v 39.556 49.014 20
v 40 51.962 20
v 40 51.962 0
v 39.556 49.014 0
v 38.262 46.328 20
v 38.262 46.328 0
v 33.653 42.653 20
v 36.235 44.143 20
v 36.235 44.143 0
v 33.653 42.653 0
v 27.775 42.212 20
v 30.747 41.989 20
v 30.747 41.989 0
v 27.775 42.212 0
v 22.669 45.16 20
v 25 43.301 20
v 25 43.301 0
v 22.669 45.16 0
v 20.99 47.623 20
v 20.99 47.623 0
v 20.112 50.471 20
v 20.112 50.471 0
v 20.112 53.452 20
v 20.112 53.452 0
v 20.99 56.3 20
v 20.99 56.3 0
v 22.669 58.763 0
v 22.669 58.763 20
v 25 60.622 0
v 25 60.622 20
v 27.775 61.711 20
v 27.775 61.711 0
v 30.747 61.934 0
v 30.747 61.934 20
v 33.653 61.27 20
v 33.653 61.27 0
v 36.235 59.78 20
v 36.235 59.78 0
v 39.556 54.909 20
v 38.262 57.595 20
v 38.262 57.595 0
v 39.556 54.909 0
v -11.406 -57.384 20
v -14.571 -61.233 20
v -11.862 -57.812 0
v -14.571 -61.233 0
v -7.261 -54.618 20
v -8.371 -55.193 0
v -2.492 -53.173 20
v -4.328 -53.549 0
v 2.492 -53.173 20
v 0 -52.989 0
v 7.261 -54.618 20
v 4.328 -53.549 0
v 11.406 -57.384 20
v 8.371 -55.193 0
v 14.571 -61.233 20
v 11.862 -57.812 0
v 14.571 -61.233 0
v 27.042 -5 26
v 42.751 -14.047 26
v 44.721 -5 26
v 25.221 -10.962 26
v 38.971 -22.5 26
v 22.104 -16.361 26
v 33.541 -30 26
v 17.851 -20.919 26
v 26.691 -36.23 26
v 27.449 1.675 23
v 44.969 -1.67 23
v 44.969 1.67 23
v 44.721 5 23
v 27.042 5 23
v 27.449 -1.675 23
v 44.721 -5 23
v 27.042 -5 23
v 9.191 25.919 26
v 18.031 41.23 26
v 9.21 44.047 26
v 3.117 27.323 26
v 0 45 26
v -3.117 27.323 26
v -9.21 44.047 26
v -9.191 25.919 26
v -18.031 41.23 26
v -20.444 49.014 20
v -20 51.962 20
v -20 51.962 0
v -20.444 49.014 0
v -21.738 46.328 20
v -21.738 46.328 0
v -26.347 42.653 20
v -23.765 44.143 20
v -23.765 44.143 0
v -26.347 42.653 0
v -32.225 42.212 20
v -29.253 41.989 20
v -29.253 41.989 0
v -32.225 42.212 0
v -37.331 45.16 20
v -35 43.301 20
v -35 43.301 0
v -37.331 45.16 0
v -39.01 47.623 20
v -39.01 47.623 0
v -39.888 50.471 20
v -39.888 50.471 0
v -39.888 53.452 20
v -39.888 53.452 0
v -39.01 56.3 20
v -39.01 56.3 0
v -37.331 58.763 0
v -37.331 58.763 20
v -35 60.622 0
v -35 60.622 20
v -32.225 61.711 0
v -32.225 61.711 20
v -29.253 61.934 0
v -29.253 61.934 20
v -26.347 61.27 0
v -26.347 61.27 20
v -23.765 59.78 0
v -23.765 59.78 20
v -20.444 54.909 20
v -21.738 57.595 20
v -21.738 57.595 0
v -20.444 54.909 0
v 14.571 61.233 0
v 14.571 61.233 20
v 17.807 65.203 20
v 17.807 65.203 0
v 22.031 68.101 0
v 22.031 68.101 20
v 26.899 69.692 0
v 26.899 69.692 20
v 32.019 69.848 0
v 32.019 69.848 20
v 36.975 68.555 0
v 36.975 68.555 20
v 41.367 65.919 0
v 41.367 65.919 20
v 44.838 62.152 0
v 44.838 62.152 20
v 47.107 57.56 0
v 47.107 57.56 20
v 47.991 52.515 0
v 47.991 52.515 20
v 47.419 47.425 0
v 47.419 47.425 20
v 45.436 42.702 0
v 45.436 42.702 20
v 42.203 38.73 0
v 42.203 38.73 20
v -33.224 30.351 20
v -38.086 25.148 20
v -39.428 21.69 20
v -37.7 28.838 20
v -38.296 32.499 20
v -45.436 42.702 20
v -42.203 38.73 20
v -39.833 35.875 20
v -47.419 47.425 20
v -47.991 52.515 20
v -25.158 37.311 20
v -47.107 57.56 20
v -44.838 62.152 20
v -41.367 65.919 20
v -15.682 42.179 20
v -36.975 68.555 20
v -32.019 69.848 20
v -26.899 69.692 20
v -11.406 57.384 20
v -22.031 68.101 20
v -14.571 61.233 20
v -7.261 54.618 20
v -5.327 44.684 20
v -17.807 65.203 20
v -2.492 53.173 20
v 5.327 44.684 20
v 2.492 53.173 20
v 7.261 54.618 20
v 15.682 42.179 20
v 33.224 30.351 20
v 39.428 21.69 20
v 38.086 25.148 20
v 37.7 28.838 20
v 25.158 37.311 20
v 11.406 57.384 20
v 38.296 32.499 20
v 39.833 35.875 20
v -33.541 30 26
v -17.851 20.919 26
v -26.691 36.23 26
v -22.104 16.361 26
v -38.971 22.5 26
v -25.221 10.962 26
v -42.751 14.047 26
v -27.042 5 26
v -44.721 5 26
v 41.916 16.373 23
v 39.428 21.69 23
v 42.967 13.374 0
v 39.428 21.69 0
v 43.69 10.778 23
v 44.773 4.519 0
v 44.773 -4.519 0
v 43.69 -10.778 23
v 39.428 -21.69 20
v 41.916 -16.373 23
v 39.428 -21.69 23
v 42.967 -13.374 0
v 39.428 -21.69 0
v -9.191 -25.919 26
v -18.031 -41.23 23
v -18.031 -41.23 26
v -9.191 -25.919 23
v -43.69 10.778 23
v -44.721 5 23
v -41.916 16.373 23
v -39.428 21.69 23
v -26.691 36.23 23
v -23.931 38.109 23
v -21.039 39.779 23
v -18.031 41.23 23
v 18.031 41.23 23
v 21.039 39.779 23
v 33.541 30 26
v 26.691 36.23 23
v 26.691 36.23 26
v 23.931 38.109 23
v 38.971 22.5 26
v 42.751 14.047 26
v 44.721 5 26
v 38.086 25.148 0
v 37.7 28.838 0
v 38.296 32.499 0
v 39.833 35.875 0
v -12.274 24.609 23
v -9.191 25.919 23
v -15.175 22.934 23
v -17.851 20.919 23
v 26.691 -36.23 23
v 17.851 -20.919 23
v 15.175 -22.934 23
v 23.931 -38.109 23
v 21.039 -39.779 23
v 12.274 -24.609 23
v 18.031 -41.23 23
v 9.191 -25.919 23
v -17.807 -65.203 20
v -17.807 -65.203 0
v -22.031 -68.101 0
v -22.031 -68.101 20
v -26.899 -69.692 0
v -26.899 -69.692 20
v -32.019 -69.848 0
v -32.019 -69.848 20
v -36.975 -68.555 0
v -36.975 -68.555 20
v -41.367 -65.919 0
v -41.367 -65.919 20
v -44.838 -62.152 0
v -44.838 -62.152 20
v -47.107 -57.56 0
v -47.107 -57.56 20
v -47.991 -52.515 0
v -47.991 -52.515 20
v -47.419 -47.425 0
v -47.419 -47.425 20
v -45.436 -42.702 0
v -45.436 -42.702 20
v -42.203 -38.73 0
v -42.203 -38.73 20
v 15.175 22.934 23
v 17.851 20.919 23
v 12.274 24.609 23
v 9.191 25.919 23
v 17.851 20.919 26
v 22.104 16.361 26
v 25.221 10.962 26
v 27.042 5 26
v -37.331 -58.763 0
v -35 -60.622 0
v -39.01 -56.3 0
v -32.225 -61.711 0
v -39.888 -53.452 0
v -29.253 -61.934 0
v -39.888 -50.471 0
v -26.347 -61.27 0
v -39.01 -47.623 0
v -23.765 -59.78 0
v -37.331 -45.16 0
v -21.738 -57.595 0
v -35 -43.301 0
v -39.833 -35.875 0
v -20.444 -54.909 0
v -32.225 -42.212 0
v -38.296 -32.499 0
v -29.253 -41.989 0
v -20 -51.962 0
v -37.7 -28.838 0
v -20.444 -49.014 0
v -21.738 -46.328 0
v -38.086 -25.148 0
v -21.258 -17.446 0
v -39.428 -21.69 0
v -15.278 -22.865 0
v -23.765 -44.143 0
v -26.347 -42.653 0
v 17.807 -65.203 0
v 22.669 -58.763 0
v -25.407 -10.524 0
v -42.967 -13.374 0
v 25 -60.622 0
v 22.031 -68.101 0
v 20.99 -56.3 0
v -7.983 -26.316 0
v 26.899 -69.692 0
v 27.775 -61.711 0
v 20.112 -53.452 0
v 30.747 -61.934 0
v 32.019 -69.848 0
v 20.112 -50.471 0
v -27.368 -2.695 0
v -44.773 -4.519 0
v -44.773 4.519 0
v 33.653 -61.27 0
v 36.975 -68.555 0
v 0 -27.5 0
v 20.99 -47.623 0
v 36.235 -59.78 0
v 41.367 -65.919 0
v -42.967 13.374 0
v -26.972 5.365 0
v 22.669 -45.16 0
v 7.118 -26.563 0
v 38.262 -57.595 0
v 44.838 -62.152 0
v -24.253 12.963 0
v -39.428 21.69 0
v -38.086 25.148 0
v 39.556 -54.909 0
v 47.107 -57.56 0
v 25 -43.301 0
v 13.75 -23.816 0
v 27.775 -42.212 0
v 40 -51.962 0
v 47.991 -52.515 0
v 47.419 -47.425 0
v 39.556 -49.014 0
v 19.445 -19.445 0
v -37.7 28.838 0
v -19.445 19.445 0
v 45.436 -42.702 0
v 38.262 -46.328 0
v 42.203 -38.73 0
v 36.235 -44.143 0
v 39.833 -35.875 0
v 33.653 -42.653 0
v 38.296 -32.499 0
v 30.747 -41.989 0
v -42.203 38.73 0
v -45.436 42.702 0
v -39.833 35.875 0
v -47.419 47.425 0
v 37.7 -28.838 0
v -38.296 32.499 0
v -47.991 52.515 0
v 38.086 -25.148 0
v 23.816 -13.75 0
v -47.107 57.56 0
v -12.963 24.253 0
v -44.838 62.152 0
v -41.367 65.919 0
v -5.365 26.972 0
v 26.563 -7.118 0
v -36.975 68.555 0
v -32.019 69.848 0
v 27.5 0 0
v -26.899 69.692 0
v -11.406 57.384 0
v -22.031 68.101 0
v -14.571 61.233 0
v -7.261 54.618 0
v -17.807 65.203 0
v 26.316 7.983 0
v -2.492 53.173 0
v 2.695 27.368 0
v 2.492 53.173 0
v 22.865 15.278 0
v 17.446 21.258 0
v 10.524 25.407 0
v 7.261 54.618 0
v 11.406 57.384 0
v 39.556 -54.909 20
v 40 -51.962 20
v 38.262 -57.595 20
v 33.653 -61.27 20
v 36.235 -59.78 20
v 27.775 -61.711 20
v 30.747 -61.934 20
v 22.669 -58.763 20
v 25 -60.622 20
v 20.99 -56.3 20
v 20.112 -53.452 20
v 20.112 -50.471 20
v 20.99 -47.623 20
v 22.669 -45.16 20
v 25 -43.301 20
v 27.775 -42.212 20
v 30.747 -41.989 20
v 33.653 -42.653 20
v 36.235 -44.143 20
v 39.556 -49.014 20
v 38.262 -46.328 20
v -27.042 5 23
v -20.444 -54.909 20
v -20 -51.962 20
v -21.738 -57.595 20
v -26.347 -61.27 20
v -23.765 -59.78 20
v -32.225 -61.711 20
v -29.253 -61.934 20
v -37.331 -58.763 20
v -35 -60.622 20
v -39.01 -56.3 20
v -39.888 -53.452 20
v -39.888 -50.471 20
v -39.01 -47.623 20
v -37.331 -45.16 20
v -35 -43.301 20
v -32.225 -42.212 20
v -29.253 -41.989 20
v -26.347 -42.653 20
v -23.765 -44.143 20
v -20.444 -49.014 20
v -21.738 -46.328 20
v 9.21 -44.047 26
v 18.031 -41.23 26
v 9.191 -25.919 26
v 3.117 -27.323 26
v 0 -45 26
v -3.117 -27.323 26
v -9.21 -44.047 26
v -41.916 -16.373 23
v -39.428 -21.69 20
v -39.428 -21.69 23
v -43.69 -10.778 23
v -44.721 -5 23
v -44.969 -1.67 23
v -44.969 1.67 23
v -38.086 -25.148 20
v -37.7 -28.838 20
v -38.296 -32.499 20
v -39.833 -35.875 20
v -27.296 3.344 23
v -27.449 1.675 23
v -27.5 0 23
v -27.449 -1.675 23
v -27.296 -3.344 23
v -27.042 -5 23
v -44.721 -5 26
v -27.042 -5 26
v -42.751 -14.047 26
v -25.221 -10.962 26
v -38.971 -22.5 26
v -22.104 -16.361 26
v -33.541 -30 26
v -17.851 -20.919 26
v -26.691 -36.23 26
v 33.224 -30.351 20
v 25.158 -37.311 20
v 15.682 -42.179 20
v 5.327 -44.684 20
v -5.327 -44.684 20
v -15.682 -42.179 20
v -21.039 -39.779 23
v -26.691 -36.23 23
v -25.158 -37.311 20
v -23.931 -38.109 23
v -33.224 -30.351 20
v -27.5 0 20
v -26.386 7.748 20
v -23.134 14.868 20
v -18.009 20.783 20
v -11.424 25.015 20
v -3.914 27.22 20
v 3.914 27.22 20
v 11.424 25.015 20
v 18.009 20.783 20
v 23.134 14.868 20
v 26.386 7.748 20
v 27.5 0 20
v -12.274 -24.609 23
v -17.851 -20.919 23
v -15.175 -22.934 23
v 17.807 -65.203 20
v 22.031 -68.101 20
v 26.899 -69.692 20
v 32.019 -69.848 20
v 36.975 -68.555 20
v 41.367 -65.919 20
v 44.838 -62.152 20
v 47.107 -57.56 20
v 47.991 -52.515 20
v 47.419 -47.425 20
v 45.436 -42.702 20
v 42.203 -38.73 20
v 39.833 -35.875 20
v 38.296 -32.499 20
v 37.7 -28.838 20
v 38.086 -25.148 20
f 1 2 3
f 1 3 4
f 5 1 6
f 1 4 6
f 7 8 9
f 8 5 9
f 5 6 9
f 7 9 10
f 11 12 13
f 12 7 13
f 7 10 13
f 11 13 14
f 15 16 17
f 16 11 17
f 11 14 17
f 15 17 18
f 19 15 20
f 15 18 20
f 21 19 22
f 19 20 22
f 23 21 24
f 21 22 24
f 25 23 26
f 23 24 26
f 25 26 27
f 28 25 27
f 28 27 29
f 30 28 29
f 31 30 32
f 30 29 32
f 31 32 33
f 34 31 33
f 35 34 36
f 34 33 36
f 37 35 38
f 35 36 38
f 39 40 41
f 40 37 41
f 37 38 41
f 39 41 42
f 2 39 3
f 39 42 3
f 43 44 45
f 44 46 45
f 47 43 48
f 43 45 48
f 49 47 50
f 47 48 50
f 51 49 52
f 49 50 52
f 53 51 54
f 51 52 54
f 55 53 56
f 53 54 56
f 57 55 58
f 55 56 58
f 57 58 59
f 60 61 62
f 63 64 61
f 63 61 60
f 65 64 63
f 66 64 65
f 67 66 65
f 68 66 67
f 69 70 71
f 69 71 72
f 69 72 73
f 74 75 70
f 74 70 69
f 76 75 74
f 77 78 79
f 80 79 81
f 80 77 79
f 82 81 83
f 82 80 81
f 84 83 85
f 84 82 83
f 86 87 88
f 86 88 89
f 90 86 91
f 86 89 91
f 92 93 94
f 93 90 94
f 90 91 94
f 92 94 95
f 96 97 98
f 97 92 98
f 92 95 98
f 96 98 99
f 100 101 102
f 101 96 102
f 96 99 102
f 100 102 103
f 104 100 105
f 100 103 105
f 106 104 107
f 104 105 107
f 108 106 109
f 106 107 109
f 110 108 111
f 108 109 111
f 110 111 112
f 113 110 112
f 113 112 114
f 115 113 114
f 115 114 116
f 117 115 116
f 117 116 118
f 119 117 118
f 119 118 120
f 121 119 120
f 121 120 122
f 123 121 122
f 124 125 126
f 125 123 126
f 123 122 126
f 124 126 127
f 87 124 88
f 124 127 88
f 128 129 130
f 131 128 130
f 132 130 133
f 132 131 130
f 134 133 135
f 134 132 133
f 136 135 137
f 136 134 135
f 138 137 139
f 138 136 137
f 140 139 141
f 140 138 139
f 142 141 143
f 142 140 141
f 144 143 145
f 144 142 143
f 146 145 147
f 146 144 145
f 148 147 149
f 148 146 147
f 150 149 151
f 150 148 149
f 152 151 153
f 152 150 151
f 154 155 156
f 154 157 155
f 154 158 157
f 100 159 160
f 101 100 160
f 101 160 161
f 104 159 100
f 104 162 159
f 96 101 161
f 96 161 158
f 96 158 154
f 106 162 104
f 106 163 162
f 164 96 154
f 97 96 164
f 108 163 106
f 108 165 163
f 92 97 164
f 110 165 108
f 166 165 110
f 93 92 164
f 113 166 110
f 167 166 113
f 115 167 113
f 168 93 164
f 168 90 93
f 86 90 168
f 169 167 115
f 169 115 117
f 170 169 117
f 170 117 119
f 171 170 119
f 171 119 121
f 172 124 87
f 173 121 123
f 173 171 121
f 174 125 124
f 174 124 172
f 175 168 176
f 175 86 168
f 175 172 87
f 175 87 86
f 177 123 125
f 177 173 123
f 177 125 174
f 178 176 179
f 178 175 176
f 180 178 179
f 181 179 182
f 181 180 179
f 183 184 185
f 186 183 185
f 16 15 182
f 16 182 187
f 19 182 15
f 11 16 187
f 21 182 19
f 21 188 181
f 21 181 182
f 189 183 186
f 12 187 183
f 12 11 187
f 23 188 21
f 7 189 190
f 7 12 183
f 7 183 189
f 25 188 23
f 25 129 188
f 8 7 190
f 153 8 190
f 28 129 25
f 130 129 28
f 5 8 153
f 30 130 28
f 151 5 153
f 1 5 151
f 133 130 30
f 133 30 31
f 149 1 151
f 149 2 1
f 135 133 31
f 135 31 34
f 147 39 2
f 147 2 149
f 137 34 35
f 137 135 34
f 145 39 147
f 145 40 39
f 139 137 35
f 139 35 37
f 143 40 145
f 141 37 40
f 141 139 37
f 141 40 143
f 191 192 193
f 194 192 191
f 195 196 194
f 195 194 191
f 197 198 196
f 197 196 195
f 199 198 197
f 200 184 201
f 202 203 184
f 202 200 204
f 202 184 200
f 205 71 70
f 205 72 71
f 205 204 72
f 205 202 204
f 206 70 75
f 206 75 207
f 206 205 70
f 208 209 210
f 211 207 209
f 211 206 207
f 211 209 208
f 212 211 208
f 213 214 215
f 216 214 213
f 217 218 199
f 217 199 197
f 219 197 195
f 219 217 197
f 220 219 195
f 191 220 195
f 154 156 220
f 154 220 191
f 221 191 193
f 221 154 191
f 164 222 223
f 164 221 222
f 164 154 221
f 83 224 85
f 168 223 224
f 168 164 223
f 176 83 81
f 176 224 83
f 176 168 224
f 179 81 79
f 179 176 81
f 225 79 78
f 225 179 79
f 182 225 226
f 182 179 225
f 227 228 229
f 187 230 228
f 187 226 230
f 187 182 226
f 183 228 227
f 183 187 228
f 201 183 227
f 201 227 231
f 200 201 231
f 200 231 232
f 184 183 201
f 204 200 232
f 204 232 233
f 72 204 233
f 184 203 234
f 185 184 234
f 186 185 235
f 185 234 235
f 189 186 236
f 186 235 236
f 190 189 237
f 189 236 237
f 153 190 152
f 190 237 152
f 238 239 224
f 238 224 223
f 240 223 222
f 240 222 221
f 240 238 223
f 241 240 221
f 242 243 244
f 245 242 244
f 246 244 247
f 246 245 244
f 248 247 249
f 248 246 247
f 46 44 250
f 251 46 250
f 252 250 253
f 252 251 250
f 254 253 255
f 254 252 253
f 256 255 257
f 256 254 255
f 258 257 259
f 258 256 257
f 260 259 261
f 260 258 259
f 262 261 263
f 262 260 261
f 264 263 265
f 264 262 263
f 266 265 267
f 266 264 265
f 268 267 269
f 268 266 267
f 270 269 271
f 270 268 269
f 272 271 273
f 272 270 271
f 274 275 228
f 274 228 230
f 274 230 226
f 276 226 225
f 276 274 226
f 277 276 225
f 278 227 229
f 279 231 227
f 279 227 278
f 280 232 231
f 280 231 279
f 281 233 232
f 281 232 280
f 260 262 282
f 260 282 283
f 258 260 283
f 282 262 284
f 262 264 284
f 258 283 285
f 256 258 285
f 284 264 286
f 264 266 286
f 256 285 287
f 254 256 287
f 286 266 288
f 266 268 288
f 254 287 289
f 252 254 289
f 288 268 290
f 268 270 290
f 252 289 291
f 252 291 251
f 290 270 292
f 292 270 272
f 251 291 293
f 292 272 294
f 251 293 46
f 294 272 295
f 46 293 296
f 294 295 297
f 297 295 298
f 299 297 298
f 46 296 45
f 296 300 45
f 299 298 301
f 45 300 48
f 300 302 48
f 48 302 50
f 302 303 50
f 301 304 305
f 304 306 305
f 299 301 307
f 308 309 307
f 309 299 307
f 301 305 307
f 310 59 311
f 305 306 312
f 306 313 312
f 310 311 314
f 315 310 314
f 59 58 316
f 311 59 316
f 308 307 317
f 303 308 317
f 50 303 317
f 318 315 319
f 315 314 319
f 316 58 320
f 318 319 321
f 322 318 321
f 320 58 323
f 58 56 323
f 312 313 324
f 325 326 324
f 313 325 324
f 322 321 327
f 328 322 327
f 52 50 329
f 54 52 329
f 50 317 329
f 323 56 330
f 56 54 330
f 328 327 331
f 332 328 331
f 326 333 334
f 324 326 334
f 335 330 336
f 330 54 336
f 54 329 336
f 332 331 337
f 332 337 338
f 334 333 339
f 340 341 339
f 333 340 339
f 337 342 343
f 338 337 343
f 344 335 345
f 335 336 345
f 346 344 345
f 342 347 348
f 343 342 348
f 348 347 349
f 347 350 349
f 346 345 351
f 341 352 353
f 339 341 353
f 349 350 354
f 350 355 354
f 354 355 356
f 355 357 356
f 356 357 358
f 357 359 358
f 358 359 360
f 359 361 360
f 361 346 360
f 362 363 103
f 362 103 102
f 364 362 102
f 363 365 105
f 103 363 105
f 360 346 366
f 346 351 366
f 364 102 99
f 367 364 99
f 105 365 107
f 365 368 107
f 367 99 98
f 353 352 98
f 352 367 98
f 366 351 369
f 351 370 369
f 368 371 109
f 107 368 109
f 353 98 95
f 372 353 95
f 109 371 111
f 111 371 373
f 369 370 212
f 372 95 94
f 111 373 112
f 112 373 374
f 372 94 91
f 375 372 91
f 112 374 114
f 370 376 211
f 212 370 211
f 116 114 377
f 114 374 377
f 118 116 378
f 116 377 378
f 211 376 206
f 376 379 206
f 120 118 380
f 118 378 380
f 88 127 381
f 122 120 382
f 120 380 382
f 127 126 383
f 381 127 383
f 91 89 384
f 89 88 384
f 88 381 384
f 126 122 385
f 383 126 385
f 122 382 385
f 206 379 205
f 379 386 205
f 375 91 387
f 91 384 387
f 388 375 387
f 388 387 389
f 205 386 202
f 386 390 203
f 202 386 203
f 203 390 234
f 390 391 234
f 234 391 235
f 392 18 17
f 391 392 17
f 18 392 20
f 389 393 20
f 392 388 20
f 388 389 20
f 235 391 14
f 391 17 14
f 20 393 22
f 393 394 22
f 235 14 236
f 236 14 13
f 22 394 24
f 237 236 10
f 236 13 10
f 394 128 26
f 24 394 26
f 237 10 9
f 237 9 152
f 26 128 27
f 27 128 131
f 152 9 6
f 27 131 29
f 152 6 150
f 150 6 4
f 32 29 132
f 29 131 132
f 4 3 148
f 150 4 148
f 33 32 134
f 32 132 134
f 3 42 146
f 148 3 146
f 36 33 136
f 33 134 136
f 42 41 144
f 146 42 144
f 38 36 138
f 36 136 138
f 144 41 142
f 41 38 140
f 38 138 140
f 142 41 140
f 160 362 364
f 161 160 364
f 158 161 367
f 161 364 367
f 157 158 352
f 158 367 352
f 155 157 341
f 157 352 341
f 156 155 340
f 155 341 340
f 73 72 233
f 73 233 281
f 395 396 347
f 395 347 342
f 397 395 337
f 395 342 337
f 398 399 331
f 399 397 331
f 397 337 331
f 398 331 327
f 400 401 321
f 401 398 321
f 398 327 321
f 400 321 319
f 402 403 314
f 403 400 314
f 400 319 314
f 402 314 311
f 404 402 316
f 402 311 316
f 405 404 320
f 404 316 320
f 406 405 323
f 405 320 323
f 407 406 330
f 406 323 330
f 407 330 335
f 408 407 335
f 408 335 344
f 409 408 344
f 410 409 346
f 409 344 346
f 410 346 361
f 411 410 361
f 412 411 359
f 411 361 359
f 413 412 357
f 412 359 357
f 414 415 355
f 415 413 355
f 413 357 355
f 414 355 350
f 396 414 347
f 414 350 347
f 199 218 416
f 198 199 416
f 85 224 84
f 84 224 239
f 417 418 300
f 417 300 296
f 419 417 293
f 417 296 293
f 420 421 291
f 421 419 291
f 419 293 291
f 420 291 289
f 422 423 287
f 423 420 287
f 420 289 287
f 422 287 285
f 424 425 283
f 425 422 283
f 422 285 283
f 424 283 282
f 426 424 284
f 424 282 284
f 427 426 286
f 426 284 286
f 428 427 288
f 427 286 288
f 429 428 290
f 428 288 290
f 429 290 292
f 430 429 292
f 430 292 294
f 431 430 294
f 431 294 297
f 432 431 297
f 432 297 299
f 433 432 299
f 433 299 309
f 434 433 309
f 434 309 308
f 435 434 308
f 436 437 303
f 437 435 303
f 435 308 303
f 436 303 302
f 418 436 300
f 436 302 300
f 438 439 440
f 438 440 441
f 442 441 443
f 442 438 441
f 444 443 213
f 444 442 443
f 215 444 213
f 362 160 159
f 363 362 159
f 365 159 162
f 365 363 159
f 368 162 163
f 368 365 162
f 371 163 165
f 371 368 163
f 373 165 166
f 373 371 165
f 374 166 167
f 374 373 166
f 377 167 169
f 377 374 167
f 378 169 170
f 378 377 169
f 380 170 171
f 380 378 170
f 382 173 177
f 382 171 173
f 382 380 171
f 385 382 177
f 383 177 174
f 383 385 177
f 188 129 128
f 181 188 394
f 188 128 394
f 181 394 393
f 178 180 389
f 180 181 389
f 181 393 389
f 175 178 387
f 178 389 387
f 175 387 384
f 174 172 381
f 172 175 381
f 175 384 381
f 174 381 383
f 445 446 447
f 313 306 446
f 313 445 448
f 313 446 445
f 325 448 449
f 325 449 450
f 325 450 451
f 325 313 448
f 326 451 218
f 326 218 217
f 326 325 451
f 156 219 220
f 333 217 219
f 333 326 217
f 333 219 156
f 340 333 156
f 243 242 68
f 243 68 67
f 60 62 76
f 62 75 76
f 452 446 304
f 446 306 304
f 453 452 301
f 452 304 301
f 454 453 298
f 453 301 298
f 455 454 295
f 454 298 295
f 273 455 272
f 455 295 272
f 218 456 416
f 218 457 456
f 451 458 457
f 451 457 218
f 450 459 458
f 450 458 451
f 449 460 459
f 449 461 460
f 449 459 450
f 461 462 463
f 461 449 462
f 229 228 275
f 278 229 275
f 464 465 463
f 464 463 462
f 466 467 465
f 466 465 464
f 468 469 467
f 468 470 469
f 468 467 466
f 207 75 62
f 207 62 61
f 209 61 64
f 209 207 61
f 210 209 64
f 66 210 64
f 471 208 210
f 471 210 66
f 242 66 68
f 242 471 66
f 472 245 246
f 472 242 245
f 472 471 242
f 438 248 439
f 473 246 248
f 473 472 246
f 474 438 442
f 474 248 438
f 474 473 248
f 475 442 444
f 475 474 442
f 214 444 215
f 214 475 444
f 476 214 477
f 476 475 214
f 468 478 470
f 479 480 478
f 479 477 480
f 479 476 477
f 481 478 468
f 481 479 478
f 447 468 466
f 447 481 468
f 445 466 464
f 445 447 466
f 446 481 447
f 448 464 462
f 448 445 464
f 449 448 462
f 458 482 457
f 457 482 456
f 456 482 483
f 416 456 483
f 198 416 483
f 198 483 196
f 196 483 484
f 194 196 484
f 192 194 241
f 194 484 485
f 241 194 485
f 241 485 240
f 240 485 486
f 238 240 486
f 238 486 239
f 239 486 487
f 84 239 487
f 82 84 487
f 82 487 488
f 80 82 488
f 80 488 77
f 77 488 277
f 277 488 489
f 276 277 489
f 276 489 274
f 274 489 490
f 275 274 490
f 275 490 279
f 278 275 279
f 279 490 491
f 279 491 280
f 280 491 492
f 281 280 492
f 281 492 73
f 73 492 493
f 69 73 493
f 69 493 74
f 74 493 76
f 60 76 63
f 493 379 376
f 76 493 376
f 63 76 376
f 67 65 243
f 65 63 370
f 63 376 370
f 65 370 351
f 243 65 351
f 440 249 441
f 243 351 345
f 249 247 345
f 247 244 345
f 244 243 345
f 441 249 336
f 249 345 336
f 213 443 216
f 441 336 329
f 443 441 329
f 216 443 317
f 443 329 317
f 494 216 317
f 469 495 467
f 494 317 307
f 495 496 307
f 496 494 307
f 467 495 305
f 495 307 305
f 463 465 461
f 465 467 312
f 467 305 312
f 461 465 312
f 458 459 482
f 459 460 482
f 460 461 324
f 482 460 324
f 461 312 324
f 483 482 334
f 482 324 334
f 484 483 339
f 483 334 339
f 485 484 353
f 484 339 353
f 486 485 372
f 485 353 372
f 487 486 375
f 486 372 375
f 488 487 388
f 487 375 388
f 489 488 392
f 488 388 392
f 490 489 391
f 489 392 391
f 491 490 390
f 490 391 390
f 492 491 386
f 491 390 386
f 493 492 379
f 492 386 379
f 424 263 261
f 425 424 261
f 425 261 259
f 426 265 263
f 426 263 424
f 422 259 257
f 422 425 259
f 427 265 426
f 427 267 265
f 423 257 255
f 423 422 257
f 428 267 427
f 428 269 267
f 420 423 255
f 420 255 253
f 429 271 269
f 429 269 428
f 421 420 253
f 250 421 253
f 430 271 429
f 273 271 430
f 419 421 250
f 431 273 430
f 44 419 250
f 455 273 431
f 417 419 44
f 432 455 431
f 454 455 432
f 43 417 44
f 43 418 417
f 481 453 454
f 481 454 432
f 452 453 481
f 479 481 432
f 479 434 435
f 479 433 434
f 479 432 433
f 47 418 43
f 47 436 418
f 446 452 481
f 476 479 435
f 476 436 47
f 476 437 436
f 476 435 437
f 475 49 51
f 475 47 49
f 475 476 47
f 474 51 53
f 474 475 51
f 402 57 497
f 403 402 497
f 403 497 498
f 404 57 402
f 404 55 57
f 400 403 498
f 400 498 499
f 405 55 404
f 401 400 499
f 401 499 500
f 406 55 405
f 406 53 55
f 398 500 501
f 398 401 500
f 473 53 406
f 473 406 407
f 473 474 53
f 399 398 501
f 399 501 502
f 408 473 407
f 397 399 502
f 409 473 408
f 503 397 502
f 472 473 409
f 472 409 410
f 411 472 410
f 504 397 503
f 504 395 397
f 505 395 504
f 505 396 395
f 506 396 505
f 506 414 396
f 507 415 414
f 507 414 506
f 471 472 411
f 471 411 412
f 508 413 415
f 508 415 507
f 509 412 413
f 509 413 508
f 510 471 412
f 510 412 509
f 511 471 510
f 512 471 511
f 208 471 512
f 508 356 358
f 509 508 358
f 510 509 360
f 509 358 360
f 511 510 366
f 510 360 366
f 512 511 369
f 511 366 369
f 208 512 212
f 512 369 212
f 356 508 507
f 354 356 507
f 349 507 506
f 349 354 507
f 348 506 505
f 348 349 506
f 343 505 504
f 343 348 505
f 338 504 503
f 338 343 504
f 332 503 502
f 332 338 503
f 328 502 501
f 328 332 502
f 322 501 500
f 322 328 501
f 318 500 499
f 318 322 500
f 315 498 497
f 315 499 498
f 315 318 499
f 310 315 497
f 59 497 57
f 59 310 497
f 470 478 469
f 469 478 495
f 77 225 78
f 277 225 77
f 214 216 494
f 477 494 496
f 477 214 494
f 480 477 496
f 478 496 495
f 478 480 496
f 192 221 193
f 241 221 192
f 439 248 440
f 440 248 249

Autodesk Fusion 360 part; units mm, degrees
sketch "Sketch1" plane through (0, 0, 0) normal (0, 0, 1) x (1, 0, 0)
  circle A0 centre (0, 0) radius 27.5
  circle A1 centre (30, -51.9615) radius 10
  line L0 (0, 0) -> (0, -67.6601)
  line L1 (0, 0) -> (30, -51.9615) construction
  line L2 (0, 0) -> (10.1597, -17.5971) construction
  line L3 (0, 0) -> (20.3193, 0) construction
  arc A2 (39.4278, -21.6899) -> (42.203, -38.7295) centre (51.6942, -28.4379) ccw
  arc A3 (14.5714, -61.2329) -> (42.203, -38.7295) centre (30, -51.9615) ccw
  circle A4 centre (-30, -51.9615) radius 10
  arc A5 (-42.203, -38.7295) -> (-39.4278, -21.6899) centre (-51.6942, -28.4379) ccw
  arc A6 (14.5714, -61.2329) -> (-14.5714, -61.2329) centre (0, -69.9893) ccw
  arc A7 (-42.203, -38.7295) -> (-14.5714, -61.2329) centre (-30, -51.9615) ccw
  arc A8 (-14.5714, 61.2329) -> (-42.203, 38.7295) centre (-30, 51.9615) ccw
  arc A9 (-39.4278, 21.6899) -> (-42.203, 38.7295) centre (-51.6942, 28.4379) ccw
  circle A10 centre (-30, 51.9615) radius 10
  arc A11 (-14.5714, 61.2329) -> (14.5714, 61.2329) centre (0, 69.9893) ccw
  arc A12 (42.203, 38.7295) -> (14.5714, 61.2329) centre (30, 51.9615) ccw
  circle A13 centre (30, 51.9615) radius 10
  arc A14 (42.203, 38.7295) -> (39.4278, 21.6899) centre (51.6942, 28.4379) ccw
  arc A15 (39.4278, -21.6899) -> (39.4278, 21.6899) centre (0, 0) ccw
  arc A16 (-39.4278, 21.6899) -> (-39.4278, -21.6899) centre (0, 0) ccw
  dimension "d1" = 55
  dimension "d2" = 90
  dimension "d4" = 20
  dimension "d5" = 36
  dimension "d6" = 28
  dimension "d7" = 60
  dimension "d8" = 34
extrude "Extrude1" add sketch "Sketch1" along normal blind 20
sketch "Sketch2" plane through (0, 0, 20) normal (0, 0, 1) x (-1, 0, 0)
  circle A0 centre (30, 51.9615) radius 10
  circle A1 centre (30, -51.9615) radius 10
  circle A2 centre (-30, -51.9615) radius 10
  circle A3 centre (-30, 51.9615) radius 10
  circle A4 centre (0, 0) radius 27.5
  arc A5 (14.5714, -61.2329) -> (42.203, -38.7295) centre (30, -51.9615) ccw
  arc A6 (39.4278, -21.6899) -> (42.203, -38.7295) centre (51.6942, -28.4379) ccw
  arc A7 (39.4278, -21.6899) -> (39.4278, 21.6899) centre (0, 0) ccw
  arc A8 (42.203, 38.7295) -> (39.4278, 21.6899) centre (51.6942, 28.4379) ccw
  arc A9 (42.203, 38.7295) -> (14.5714, 61.2329) centre (30, 51.9615) ccw
  arc A10 (-14.5714, 61.2329) -> (14.5714, 61.2329) centre (0, 69.9893) ccw
  arc A11 (-14.5714, 61.2329) -> (-42.203, 38.7295) centre (-30, 51.9615) ccw
  arc A12 (-39.4278, 21.6899) -> (-42.203, 38.7295) centre (-51.6942, 28.4379) ccw
  arc A13 (-39.4278, 21.6899) -> (-39.4278, -21.6899) centre (0, 0) ccw
  arc A14 (-42.203, -38.7295) -> (-39.4278, -21.6899) centre (-51.6942, -28.4379) ccw
  arc A15 (-42.203, -38.7295) -> (-14.5714, -61.2329) centre (-30, -51.9615) ccw
  arc A16 (14.5714, -61.2329) -> (-14.5714, -61.2329) centre (0, -69.9893) ccw
  circle A17 centre (0, 0) radius 27.5
  circle A18 centre (0, 0) radius 45
extrude "Extrude2" add sketch "Sketch2" along normal blind 3 contours A7 A13 A18
sketch "Sketch3" plane through (0, 0, 23) normal (0, 0, 1) x (-1, 0, 0)
  circle A0 centre (0, 0) radius 27.5
  circle A1 centre (0, 0) radius 45
  line L0 (0, 0) -> (45, 0) construction
  line L1 (45, 0) -> (45, -1)
  line L2 (44.7214, -5) -> (27.0416, -5)
  line L3 (44.7214, 5) -> (27.0416, 5)
  line L4 (26.6908, 36.2298) -> (17.8509, 20.9187)
  line L5 (18.0306, 41.2298) -> (9.1907, 25.9187)
  line L6 (-18.0306, 41.2298) -> (-9.1907, 25.9187)
  line L7 (-26.6908, 36.2298) -> (-17.8509, 20.9187)
  line L8 (-44.7214, 5) -> (-27.0416, 5)
  line L9 (-44.7214, -5) -> (-27.0416, -5)
  line L10 (-26.6908, -36.2298) -> (-17.8509, -20.9187)
  line L11 (-18.0306, -41.2298) -> (-9.1907, -25.9187)
  line L12 (18.0306, -41.2298) -> (9.1907, -25.9187)
  line L13 (26.6908, -36.2298) -> (17.8509, -20.9187)
  arc A2 (-9.1907, -25.9187) -> (9.1907, -25.9187) centre (0, 0) ccw
  arc A3 (-18.0306, -41.2298) -> (18.0306, -41.2298) centre (0, 0) ccw
  arc A4 (-44.7214, -5) -> (-26.6908, -36.2298) centre (0, 0) ccw
  arc A5 (-27.0416, -5) -> (-17.8509, -20.9187) centre (0, 0) ccw
  arc A6 (17.8509, -20.9187) -> (27.0416, -5) centre (0, 0) ccw
  arc A7 (26.6908, -36.2298) -> (44.7214, -5) centre (0, 0) ccw
  arc A8 (27.0416, 5) -> (17.8509, 20.9187) centre (0, 0) ccw
  arc A9 (9.1907, 25.9187) -> (-9.1907, 25.9187) centre (0, 0) ccw
  arc A10 (-17.8509, 20.9187) -> (-27.0416, 5) centre (0, 0) ccw
  arc A11 (-26.6908, 36.2298) -> (-44.7214, 5) centre (0, 0) ccw
  arc A12 (44.7214, 5) -> (26.6908, 36.2298) centre (0, 0) ccw
  arc A13 (18.0306, 41.2298) -> (-18.0306, 41.2298) centre (0, 0) ccw
  dimension "d15" = 360
extrude "Extrude3" add sketch "Sketch3" along normal blind 3 contours A0 A1 L3 L4 A8 A12 | A0 A1 L2 L13 A6 A7 | A0 A1 L5 L6 A9 A13 | A0 A1 L11 L12 A2 A3 | A0 A1 L7 L8 A10 A11 | A0 A1 L9 L10 A4 A5
